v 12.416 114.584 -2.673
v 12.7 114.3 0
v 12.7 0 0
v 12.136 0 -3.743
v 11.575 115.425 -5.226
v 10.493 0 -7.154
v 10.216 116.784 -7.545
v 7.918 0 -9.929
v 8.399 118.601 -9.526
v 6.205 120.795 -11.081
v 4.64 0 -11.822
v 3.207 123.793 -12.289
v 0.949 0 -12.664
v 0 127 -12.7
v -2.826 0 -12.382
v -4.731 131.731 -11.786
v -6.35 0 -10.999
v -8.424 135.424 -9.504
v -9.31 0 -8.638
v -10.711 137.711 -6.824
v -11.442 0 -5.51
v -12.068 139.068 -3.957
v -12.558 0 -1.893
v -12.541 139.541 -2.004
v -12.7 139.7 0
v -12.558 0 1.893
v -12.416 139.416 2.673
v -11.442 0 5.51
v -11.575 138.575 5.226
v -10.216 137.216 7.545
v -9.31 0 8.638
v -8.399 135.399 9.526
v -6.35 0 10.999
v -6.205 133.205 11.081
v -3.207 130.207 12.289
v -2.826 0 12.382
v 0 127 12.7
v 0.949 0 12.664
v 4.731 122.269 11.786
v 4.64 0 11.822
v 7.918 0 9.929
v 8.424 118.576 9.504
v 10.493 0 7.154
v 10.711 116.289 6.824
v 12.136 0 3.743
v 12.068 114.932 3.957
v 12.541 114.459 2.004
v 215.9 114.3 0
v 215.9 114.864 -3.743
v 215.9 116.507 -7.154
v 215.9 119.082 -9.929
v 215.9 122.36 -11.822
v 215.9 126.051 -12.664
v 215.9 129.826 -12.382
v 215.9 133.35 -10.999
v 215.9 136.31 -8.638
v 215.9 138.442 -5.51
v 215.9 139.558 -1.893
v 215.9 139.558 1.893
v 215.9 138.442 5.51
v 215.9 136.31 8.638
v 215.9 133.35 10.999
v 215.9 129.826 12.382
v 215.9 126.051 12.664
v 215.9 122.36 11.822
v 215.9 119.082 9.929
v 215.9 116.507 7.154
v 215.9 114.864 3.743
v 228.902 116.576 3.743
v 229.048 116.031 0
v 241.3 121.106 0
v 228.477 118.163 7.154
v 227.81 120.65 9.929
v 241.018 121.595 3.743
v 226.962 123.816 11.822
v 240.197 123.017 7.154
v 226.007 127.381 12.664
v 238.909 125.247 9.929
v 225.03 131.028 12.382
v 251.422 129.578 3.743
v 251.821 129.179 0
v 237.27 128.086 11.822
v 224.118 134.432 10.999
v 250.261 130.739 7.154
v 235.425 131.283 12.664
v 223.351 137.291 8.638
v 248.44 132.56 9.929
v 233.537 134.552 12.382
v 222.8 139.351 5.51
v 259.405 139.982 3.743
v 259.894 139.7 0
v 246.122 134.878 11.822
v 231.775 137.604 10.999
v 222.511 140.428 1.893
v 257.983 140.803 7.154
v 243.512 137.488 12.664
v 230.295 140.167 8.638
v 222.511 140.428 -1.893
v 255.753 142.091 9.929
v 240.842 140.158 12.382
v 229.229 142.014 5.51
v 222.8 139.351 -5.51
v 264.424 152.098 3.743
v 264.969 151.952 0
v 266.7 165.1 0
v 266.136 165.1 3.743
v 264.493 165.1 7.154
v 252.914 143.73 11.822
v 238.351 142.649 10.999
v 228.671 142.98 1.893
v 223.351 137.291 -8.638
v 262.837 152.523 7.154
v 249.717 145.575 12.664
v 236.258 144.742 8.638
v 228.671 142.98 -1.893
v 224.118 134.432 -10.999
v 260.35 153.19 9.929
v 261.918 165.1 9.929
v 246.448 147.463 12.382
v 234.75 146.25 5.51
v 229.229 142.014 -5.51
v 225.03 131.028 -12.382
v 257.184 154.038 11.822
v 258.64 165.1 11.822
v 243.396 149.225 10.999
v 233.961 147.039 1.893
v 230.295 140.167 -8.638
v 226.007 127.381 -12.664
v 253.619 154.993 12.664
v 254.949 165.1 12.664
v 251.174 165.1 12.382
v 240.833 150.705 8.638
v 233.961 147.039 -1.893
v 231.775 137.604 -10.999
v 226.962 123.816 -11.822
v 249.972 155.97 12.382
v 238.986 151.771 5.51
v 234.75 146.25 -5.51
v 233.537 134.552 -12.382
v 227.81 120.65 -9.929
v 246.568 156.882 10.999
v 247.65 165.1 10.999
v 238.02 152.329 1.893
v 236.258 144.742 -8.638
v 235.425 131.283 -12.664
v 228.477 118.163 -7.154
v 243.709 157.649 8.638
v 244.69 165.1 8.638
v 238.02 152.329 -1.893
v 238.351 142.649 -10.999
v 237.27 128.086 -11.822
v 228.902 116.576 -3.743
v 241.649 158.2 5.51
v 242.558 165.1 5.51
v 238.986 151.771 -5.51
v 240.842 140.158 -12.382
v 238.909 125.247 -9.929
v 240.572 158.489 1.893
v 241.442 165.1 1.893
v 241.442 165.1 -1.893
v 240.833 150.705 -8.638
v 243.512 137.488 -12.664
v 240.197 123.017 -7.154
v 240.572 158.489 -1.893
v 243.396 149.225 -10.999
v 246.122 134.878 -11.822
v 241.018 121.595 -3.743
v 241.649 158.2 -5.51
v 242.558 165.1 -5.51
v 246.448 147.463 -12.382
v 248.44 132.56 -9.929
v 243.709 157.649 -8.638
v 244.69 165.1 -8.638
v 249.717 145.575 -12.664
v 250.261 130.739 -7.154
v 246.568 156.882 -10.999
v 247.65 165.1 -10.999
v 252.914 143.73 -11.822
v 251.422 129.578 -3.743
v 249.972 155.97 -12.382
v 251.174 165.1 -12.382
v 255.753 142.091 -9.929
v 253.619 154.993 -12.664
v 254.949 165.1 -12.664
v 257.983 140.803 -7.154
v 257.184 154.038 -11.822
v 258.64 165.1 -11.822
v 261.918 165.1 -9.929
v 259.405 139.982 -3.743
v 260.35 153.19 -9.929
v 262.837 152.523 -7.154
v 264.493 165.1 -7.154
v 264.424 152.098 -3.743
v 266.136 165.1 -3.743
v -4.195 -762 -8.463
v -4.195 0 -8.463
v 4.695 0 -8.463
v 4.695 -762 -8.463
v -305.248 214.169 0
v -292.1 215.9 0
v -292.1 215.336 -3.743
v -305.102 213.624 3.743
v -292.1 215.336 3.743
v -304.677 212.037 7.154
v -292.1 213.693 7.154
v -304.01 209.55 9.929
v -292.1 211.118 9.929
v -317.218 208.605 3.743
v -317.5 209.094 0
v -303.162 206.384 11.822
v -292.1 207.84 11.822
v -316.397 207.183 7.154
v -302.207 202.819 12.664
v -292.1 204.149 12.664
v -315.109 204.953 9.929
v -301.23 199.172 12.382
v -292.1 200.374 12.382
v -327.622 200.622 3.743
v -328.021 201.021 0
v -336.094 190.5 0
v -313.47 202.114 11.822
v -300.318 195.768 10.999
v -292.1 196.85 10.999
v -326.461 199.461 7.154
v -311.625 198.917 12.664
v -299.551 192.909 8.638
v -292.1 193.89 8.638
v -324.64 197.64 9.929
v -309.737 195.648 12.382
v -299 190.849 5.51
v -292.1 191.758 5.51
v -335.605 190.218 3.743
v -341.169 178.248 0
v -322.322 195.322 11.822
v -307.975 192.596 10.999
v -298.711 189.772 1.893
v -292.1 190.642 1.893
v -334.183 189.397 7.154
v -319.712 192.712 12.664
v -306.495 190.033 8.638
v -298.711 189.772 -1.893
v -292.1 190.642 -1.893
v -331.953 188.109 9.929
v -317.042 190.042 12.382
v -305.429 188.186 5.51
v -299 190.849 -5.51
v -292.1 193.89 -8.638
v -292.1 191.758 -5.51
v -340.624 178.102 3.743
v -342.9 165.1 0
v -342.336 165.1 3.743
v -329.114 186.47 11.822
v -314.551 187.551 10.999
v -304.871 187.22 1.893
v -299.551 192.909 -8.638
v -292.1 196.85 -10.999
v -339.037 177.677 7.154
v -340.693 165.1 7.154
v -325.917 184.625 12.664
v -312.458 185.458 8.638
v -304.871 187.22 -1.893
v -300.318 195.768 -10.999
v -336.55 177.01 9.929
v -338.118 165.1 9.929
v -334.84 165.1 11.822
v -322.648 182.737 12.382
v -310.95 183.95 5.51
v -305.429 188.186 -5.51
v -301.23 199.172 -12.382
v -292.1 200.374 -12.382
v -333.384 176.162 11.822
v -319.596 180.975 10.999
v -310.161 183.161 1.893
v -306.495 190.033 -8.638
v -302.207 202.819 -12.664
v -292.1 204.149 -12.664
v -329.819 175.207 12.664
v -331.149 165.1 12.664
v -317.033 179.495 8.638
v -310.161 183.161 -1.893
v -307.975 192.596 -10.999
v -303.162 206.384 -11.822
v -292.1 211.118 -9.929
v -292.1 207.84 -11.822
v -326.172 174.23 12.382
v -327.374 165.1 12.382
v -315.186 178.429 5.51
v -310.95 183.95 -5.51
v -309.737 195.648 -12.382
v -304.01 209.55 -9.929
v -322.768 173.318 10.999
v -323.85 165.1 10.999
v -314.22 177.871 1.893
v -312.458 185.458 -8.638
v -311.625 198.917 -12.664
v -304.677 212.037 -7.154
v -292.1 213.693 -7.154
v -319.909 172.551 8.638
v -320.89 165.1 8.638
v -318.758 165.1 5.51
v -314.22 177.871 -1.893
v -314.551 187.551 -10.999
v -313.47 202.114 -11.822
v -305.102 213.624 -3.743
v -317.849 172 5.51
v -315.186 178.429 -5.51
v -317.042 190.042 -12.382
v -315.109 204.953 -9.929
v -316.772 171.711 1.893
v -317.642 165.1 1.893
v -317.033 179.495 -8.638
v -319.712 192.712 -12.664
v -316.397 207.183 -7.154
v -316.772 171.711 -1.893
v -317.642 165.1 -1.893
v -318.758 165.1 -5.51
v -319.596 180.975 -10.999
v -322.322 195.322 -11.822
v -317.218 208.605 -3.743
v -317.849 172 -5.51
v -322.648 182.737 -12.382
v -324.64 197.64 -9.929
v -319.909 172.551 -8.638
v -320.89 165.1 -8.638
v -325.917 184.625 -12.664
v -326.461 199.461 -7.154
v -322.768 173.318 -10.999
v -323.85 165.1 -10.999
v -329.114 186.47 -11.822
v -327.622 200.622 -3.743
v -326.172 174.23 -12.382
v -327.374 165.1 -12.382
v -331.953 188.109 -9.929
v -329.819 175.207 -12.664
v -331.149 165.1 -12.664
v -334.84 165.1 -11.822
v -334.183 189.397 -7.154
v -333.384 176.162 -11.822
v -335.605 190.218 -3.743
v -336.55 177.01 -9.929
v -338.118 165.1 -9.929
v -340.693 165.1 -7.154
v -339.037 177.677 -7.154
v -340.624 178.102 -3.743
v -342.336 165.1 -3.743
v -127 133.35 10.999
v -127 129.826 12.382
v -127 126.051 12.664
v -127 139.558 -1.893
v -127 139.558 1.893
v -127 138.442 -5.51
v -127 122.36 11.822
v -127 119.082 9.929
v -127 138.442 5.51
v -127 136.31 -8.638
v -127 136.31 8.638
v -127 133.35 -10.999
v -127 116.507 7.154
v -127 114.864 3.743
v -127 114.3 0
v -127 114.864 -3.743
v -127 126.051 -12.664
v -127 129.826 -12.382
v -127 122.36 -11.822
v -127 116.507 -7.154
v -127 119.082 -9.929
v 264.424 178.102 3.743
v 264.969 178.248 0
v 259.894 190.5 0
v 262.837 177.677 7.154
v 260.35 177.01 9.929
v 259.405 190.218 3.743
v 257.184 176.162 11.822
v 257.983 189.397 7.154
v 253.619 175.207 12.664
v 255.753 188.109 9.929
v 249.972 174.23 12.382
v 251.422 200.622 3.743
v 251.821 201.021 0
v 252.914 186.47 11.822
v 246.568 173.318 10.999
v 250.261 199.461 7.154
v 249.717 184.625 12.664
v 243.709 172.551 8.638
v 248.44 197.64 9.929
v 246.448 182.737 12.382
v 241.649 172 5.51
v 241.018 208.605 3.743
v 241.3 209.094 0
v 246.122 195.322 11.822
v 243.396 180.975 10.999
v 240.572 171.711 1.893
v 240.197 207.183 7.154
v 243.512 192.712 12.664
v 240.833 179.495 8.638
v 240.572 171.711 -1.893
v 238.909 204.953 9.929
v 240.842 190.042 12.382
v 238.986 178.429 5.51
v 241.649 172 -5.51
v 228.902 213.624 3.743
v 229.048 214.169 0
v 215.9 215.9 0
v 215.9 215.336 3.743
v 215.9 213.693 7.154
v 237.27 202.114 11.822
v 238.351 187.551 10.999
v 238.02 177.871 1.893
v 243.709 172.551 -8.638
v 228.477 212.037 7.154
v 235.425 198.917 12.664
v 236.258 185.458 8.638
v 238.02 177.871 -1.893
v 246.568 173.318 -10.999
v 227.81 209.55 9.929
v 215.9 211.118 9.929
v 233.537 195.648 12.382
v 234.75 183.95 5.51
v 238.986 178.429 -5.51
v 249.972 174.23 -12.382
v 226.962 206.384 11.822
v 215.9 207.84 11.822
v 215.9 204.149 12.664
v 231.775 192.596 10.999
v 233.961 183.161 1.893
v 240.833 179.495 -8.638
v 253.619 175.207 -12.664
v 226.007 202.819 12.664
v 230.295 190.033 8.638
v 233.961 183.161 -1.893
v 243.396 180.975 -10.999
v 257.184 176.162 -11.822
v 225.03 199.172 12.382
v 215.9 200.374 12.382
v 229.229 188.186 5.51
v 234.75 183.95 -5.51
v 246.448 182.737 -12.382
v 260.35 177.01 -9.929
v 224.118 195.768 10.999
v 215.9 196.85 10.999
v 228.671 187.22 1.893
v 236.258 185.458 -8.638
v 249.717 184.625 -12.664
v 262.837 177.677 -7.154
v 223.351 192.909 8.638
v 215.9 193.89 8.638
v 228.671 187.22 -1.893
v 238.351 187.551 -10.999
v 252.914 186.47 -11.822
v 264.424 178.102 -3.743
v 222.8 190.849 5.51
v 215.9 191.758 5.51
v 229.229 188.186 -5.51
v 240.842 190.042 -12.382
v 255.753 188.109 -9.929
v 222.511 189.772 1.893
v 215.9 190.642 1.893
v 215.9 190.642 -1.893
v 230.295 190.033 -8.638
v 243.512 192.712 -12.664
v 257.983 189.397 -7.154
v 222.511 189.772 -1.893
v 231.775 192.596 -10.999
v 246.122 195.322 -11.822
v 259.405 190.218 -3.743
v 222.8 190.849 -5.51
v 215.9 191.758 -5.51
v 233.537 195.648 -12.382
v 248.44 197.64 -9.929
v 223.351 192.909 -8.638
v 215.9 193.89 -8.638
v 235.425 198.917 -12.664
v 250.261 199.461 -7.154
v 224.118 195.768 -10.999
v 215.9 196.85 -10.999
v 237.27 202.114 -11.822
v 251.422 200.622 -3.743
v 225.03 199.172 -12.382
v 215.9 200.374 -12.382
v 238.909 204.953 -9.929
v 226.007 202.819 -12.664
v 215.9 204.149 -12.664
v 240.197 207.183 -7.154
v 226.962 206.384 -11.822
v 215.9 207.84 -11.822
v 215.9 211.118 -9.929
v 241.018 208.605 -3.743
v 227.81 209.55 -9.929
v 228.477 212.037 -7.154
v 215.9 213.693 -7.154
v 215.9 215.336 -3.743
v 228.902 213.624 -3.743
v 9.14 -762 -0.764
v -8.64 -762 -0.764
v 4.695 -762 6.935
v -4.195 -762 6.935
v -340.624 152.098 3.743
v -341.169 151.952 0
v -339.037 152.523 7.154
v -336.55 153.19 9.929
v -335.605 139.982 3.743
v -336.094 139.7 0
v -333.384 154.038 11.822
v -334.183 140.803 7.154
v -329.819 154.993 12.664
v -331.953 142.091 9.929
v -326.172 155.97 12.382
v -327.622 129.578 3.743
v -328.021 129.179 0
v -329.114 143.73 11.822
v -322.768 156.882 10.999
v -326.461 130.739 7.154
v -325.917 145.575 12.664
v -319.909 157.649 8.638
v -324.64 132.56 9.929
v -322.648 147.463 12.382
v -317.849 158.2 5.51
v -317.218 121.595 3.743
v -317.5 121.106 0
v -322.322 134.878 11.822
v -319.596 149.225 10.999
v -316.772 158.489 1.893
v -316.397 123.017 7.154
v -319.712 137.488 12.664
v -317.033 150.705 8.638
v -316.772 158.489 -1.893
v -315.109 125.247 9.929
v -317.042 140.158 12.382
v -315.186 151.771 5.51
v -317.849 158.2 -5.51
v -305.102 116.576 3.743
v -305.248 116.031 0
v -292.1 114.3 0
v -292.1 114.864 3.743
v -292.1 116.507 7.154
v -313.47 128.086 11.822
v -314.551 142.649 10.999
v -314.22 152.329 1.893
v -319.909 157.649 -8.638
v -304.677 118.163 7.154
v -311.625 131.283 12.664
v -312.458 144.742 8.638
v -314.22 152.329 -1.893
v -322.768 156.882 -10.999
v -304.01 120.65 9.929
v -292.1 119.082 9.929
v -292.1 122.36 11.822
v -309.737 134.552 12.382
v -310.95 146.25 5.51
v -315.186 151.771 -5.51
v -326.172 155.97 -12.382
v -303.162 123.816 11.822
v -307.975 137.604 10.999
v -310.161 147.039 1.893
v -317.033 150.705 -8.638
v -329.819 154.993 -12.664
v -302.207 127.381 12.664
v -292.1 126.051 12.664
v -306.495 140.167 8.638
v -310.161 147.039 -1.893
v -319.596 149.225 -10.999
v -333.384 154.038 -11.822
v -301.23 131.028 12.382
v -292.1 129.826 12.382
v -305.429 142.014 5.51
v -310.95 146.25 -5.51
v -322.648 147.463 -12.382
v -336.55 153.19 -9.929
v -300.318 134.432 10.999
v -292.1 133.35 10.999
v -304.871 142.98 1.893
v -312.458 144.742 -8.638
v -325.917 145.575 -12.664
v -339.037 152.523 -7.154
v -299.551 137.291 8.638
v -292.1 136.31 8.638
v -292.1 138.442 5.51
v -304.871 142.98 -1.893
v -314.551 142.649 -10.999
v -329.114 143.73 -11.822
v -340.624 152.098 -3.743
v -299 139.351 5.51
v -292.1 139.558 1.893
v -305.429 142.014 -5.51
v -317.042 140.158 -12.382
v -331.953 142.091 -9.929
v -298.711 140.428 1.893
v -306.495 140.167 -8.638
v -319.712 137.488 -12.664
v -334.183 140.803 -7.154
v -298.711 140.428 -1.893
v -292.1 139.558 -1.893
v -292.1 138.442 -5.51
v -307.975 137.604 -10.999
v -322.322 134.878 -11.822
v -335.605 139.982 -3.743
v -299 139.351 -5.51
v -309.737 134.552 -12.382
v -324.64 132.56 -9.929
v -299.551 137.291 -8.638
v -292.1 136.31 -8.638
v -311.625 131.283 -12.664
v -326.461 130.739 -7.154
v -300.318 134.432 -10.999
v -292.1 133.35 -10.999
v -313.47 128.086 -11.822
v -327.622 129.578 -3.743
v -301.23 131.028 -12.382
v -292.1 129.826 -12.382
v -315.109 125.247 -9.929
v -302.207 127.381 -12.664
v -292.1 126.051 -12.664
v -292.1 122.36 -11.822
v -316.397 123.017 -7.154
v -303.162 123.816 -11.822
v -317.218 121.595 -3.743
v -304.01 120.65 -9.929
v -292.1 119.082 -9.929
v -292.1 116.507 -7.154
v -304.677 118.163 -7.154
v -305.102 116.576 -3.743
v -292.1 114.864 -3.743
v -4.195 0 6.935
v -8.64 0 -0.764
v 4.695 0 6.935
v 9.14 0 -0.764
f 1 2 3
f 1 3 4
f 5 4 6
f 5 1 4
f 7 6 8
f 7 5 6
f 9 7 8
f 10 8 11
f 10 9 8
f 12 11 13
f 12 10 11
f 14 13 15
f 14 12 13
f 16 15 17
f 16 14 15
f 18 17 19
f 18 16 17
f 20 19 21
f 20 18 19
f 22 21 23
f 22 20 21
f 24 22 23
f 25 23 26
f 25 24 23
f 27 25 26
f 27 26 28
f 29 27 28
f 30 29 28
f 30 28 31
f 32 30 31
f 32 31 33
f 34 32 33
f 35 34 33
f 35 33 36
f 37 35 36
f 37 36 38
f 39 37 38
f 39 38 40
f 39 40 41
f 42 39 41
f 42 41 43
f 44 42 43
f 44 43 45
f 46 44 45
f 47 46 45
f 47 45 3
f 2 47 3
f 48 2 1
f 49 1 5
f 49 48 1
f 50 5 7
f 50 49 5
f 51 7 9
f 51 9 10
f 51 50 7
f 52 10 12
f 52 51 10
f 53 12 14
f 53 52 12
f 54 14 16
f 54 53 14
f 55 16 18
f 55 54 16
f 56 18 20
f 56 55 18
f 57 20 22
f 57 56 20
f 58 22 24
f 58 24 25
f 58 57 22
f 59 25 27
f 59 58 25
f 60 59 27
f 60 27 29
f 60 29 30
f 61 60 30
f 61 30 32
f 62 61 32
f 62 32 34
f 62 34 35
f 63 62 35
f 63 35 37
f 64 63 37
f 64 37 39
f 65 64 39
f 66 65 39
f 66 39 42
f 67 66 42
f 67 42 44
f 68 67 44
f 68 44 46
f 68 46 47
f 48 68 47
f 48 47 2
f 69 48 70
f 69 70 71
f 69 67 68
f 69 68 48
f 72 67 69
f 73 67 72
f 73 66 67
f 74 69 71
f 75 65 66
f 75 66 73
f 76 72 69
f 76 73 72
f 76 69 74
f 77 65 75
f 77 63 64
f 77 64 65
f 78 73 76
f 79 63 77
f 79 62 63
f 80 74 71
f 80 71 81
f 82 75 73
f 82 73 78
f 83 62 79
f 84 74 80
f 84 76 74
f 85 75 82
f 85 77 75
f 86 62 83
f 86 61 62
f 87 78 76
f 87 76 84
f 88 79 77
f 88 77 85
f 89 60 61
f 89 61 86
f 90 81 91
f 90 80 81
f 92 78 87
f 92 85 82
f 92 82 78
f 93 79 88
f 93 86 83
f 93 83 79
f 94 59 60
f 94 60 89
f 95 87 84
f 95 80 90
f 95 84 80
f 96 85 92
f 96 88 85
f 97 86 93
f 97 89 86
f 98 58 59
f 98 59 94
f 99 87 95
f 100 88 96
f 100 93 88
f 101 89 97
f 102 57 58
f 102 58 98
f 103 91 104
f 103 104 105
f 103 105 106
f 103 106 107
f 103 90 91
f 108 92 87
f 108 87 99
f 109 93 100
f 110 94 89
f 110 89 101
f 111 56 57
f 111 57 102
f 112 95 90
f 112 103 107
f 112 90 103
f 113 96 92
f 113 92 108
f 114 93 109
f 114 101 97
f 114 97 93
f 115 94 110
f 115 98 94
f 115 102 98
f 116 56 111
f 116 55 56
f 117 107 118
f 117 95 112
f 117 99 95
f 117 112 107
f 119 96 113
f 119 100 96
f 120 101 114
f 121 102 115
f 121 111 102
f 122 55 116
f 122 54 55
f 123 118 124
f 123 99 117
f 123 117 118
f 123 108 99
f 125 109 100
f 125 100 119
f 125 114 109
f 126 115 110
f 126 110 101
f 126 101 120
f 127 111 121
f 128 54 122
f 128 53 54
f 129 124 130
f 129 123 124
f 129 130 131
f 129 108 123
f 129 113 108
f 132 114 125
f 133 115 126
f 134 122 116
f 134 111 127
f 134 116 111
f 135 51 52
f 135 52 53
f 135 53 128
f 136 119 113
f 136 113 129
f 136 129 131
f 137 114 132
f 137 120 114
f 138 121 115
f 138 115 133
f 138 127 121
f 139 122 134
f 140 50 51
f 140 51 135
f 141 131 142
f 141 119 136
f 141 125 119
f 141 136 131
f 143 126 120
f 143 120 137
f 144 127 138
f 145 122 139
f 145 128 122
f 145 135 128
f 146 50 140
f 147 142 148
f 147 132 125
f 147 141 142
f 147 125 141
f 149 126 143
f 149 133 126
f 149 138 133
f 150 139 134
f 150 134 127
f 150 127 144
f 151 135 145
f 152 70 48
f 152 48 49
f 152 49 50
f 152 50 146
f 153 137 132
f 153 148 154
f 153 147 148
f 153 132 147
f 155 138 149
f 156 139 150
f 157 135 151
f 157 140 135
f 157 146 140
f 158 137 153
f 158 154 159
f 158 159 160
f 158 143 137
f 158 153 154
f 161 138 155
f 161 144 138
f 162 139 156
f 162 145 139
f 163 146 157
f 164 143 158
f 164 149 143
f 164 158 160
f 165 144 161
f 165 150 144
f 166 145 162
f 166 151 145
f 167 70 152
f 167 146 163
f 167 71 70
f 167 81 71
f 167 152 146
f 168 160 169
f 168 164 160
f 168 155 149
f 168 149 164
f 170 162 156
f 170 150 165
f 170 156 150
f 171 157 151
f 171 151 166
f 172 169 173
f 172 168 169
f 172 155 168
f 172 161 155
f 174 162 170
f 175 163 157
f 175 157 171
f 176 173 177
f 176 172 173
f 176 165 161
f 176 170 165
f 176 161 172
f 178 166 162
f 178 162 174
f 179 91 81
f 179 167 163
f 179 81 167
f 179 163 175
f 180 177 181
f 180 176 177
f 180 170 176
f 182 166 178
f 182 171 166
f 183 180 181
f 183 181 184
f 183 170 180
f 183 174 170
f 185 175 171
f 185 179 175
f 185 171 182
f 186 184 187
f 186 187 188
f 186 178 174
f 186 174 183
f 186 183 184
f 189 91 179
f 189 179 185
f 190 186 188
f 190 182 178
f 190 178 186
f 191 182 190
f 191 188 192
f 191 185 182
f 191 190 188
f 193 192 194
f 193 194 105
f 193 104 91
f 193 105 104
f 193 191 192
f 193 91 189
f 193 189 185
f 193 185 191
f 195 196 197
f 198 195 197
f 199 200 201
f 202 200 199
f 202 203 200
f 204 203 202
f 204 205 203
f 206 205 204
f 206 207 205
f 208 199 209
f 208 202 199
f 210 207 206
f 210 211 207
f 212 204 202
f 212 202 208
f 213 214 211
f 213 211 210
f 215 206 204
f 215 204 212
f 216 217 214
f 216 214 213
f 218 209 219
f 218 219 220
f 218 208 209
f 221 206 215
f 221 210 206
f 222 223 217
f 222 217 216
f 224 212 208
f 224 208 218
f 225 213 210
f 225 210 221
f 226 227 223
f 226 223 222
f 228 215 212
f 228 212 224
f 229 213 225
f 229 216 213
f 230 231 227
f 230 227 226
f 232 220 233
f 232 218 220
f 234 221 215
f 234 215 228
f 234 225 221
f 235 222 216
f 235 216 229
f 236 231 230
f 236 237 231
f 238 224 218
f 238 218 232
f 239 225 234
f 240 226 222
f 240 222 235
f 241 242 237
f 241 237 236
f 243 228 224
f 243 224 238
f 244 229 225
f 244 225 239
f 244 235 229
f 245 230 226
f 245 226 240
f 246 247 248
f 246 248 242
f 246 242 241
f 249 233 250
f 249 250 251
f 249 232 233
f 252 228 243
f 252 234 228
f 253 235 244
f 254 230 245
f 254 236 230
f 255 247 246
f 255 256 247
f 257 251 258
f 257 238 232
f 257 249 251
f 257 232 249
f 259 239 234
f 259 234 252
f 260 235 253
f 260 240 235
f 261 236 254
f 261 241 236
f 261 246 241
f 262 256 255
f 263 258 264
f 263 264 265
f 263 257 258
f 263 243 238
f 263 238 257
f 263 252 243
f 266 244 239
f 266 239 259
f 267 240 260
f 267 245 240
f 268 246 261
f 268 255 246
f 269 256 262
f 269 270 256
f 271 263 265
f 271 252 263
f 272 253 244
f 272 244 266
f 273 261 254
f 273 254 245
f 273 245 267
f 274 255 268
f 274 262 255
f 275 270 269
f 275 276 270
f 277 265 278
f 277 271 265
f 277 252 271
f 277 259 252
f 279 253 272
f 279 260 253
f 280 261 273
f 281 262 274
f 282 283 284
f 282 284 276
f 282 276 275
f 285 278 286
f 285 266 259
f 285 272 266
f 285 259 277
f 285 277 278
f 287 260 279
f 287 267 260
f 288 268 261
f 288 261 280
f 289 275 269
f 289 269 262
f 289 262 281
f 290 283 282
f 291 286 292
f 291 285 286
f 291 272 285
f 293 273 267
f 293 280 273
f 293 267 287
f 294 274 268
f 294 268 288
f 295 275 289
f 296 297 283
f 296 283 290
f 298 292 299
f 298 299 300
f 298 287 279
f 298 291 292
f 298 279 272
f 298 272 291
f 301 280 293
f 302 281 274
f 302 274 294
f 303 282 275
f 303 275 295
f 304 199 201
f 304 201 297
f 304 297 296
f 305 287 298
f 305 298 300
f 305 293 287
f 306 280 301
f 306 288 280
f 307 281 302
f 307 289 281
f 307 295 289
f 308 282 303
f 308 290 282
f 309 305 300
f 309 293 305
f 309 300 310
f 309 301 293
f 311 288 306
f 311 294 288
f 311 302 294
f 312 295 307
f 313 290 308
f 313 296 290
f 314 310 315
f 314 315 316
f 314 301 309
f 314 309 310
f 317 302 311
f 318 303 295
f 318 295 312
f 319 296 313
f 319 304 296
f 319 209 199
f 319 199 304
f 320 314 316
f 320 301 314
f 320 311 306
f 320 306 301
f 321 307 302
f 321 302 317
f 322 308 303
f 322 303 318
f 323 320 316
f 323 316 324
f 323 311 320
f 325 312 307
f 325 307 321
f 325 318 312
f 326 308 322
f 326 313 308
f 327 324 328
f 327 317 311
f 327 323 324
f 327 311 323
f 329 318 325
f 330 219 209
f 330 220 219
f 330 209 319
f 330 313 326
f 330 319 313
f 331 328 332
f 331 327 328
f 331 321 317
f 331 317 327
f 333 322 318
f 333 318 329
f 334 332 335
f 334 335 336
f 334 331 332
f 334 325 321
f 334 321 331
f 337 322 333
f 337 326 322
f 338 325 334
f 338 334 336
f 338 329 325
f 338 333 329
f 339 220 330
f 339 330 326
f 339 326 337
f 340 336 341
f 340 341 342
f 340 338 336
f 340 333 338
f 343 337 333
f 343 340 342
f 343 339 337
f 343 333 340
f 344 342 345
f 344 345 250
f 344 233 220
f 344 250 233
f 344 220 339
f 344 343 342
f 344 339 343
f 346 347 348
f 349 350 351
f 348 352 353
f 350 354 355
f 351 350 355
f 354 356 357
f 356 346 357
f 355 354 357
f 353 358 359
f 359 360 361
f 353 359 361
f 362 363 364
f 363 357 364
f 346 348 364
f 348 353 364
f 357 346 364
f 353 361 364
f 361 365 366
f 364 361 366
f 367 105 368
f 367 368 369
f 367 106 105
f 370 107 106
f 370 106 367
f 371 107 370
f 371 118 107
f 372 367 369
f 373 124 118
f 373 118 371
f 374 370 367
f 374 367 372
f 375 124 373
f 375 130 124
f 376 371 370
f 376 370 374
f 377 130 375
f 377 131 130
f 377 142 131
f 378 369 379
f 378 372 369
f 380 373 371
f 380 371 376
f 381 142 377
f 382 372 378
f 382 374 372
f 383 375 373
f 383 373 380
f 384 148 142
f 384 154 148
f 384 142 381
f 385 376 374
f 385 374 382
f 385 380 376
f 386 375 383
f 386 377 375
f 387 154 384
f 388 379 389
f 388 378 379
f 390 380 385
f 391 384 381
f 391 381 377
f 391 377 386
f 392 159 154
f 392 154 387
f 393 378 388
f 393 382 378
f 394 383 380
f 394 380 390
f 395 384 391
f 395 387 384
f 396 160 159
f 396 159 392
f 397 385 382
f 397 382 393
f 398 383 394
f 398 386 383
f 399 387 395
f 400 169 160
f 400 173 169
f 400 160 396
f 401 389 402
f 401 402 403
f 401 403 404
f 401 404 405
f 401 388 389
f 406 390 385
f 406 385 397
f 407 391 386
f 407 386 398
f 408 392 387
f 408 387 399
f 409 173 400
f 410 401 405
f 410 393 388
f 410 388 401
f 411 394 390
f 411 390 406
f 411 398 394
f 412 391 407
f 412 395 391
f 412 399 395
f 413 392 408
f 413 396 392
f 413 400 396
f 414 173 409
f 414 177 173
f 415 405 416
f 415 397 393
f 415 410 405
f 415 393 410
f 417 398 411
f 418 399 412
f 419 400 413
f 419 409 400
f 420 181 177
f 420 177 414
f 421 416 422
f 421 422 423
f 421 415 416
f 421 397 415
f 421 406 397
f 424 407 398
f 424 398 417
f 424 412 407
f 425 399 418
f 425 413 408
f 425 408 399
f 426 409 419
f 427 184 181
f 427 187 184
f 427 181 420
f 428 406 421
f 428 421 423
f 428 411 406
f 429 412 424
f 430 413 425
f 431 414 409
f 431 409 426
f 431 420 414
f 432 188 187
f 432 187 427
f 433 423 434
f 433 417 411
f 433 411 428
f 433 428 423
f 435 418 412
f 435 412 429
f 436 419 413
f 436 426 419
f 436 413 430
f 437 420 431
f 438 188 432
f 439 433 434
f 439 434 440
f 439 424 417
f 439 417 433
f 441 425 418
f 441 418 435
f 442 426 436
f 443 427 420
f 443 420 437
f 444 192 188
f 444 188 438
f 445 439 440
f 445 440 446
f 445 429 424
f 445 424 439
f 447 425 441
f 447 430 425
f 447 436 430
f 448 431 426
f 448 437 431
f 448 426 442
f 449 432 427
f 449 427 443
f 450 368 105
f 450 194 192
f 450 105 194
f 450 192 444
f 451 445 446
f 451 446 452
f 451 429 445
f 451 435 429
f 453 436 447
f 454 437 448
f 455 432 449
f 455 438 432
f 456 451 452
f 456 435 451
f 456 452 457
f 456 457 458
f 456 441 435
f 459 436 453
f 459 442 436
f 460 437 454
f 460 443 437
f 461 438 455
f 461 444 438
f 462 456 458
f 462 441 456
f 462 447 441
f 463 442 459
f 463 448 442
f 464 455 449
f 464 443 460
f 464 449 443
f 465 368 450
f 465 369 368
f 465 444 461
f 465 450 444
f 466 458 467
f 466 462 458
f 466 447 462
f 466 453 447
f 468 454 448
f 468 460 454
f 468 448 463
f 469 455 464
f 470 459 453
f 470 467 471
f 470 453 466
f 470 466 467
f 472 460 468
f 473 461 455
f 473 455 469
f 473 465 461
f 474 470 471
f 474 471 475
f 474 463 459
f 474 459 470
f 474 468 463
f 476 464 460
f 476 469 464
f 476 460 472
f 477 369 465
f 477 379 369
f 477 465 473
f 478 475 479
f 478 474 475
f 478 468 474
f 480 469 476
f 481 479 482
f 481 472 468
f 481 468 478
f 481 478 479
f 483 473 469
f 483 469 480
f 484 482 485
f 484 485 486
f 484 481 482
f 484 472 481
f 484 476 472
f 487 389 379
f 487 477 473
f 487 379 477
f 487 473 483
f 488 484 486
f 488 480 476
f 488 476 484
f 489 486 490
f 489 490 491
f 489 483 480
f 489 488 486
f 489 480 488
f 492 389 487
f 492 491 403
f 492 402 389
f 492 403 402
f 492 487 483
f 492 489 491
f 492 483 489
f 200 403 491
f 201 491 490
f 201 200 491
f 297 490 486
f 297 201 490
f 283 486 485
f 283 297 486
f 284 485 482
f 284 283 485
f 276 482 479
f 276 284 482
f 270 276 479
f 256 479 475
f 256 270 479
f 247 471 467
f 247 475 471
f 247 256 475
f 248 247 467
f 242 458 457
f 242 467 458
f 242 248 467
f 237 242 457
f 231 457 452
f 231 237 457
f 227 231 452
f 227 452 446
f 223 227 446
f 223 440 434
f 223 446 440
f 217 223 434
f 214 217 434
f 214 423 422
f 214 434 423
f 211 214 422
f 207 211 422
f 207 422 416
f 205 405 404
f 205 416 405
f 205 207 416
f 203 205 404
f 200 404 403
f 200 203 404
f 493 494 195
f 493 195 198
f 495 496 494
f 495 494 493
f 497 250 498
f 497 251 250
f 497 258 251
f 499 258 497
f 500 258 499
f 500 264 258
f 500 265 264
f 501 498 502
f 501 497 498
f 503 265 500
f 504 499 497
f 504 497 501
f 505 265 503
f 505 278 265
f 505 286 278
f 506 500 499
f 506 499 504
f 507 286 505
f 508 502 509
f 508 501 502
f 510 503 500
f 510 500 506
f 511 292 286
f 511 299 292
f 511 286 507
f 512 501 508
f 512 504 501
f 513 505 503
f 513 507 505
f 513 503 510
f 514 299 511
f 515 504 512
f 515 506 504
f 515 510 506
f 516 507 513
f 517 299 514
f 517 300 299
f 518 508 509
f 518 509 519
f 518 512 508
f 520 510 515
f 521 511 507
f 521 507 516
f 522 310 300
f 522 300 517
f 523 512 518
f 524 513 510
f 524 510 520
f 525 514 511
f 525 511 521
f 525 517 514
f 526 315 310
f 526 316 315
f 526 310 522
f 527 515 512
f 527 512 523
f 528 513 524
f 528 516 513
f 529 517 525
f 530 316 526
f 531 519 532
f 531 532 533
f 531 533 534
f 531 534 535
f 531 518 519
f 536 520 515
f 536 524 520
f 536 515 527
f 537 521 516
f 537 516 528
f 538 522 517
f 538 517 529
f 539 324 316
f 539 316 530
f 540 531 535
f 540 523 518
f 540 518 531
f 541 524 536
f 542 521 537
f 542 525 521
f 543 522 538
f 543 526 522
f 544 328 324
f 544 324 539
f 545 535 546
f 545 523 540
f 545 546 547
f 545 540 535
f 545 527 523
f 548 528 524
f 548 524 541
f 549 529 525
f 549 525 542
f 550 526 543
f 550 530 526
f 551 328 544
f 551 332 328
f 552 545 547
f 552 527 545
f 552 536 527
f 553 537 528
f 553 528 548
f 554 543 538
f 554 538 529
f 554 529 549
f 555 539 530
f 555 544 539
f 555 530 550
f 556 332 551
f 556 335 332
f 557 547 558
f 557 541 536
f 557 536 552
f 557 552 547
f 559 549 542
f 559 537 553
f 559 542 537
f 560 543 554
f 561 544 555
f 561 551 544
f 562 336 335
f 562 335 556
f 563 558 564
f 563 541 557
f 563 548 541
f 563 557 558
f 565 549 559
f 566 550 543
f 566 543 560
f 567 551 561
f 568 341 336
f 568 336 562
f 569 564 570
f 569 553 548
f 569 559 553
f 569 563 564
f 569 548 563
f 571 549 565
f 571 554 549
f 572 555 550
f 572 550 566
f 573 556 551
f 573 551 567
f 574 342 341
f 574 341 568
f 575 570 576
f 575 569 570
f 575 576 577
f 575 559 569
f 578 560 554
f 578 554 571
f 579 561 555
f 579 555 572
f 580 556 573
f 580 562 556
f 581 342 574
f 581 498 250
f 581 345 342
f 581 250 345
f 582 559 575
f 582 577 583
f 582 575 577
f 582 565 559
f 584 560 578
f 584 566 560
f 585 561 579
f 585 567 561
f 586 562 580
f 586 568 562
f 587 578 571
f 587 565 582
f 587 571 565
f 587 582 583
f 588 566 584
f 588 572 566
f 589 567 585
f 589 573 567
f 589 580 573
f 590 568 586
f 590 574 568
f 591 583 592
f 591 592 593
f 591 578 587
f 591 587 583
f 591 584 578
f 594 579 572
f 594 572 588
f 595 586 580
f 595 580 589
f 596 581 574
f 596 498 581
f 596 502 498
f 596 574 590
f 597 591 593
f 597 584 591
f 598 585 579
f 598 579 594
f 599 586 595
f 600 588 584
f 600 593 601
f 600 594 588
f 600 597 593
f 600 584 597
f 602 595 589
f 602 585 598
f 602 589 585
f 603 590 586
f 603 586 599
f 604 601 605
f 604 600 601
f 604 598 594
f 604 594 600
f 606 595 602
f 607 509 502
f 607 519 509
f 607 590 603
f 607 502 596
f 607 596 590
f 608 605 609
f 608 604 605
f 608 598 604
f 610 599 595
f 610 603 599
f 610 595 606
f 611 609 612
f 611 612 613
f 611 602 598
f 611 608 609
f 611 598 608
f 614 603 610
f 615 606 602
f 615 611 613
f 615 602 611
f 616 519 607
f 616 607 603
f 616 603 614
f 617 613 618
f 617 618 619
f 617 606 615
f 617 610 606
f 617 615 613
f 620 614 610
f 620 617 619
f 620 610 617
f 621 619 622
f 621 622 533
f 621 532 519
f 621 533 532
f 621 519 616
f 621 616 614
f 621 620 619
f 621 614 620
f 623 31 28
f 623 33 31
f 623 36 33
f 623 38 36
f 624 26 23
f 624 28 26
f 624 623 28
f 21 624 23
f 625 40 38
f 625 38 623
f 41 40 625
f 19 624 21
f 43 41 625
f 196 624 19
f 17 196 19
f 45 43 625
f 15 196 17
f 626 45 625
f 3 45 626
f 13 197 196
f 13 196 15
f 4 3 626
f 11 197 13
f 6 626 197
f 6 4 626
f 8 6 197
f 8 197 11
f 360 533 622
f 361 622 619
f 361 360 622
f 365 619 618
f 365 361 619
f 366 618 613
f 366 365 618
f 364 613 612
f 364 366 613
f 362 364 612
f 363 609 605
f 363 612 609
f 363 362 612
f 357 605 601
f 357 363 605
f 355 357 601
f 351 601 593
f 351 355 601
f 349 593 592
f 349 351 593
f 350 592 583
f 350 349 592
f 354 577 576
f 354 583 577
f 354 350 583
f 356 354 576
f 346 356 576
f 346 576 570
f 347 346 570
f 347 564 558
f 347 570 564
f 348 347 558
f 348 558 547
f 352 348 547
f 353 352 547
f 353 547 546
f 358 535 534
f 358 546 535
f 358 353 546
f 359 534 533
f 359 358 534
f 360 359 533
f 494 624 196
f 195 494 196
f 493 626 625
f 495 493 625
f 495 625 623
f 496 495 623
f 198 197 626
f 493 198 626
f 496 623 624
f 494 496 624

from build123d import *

# Parameters (mm, degrees)
F0_R     = 12.7
F4_DEPTH = 762


with BuildPart() as f2:
    # F2: sweep along a path in F1
    with BuildLine(Plane.XY) as f2_path:
        Line((0, 0), (0, 127))
        Line((0, 127), (215.9, 127))
        ThreePointArc((215.9, 127), (242.8407683632, 138.1592316368), (254, 165.1))
        ThreePointArc((254, 165.1), (242.8407683632, 192.0407683632), (215.9, 203.2))
        Line((215.9, 203.2), (-292.1, 203.2))
        ThreePointArc((-292.1, 203.2), (-319.0407683632, 192.0407683632), (-330.2, 165.1))
        ThreePointArc((-330.2, 165.1), (-319.0407683632, 138.1592316368), (-292.1, 127))
        Line((-292.1, 127), (-127, 127))
    # F0 (on Front) → F2 (sweep)
    with BuildSketch(Plane.XZ):
        Circle(F0_R)
    sweep(path=f2_path.line, transition=Transition.RIGHT)

    # F3 (on face) → F4 (join)
    with BuildSketch(Plane.XZ):
        Polygon((4.6947609848, 6.9345362704), (-4.1952390152, 6.9345362704), (-8.6402390152, -0.7644295692), (-4.1952390152, -8.4633954089), (4.6947609848, -8.4633954089), (9.1397609848, -0.7644295692), align=None)
    extrude(amount=F4_DEPTH)


solid = f2.part
